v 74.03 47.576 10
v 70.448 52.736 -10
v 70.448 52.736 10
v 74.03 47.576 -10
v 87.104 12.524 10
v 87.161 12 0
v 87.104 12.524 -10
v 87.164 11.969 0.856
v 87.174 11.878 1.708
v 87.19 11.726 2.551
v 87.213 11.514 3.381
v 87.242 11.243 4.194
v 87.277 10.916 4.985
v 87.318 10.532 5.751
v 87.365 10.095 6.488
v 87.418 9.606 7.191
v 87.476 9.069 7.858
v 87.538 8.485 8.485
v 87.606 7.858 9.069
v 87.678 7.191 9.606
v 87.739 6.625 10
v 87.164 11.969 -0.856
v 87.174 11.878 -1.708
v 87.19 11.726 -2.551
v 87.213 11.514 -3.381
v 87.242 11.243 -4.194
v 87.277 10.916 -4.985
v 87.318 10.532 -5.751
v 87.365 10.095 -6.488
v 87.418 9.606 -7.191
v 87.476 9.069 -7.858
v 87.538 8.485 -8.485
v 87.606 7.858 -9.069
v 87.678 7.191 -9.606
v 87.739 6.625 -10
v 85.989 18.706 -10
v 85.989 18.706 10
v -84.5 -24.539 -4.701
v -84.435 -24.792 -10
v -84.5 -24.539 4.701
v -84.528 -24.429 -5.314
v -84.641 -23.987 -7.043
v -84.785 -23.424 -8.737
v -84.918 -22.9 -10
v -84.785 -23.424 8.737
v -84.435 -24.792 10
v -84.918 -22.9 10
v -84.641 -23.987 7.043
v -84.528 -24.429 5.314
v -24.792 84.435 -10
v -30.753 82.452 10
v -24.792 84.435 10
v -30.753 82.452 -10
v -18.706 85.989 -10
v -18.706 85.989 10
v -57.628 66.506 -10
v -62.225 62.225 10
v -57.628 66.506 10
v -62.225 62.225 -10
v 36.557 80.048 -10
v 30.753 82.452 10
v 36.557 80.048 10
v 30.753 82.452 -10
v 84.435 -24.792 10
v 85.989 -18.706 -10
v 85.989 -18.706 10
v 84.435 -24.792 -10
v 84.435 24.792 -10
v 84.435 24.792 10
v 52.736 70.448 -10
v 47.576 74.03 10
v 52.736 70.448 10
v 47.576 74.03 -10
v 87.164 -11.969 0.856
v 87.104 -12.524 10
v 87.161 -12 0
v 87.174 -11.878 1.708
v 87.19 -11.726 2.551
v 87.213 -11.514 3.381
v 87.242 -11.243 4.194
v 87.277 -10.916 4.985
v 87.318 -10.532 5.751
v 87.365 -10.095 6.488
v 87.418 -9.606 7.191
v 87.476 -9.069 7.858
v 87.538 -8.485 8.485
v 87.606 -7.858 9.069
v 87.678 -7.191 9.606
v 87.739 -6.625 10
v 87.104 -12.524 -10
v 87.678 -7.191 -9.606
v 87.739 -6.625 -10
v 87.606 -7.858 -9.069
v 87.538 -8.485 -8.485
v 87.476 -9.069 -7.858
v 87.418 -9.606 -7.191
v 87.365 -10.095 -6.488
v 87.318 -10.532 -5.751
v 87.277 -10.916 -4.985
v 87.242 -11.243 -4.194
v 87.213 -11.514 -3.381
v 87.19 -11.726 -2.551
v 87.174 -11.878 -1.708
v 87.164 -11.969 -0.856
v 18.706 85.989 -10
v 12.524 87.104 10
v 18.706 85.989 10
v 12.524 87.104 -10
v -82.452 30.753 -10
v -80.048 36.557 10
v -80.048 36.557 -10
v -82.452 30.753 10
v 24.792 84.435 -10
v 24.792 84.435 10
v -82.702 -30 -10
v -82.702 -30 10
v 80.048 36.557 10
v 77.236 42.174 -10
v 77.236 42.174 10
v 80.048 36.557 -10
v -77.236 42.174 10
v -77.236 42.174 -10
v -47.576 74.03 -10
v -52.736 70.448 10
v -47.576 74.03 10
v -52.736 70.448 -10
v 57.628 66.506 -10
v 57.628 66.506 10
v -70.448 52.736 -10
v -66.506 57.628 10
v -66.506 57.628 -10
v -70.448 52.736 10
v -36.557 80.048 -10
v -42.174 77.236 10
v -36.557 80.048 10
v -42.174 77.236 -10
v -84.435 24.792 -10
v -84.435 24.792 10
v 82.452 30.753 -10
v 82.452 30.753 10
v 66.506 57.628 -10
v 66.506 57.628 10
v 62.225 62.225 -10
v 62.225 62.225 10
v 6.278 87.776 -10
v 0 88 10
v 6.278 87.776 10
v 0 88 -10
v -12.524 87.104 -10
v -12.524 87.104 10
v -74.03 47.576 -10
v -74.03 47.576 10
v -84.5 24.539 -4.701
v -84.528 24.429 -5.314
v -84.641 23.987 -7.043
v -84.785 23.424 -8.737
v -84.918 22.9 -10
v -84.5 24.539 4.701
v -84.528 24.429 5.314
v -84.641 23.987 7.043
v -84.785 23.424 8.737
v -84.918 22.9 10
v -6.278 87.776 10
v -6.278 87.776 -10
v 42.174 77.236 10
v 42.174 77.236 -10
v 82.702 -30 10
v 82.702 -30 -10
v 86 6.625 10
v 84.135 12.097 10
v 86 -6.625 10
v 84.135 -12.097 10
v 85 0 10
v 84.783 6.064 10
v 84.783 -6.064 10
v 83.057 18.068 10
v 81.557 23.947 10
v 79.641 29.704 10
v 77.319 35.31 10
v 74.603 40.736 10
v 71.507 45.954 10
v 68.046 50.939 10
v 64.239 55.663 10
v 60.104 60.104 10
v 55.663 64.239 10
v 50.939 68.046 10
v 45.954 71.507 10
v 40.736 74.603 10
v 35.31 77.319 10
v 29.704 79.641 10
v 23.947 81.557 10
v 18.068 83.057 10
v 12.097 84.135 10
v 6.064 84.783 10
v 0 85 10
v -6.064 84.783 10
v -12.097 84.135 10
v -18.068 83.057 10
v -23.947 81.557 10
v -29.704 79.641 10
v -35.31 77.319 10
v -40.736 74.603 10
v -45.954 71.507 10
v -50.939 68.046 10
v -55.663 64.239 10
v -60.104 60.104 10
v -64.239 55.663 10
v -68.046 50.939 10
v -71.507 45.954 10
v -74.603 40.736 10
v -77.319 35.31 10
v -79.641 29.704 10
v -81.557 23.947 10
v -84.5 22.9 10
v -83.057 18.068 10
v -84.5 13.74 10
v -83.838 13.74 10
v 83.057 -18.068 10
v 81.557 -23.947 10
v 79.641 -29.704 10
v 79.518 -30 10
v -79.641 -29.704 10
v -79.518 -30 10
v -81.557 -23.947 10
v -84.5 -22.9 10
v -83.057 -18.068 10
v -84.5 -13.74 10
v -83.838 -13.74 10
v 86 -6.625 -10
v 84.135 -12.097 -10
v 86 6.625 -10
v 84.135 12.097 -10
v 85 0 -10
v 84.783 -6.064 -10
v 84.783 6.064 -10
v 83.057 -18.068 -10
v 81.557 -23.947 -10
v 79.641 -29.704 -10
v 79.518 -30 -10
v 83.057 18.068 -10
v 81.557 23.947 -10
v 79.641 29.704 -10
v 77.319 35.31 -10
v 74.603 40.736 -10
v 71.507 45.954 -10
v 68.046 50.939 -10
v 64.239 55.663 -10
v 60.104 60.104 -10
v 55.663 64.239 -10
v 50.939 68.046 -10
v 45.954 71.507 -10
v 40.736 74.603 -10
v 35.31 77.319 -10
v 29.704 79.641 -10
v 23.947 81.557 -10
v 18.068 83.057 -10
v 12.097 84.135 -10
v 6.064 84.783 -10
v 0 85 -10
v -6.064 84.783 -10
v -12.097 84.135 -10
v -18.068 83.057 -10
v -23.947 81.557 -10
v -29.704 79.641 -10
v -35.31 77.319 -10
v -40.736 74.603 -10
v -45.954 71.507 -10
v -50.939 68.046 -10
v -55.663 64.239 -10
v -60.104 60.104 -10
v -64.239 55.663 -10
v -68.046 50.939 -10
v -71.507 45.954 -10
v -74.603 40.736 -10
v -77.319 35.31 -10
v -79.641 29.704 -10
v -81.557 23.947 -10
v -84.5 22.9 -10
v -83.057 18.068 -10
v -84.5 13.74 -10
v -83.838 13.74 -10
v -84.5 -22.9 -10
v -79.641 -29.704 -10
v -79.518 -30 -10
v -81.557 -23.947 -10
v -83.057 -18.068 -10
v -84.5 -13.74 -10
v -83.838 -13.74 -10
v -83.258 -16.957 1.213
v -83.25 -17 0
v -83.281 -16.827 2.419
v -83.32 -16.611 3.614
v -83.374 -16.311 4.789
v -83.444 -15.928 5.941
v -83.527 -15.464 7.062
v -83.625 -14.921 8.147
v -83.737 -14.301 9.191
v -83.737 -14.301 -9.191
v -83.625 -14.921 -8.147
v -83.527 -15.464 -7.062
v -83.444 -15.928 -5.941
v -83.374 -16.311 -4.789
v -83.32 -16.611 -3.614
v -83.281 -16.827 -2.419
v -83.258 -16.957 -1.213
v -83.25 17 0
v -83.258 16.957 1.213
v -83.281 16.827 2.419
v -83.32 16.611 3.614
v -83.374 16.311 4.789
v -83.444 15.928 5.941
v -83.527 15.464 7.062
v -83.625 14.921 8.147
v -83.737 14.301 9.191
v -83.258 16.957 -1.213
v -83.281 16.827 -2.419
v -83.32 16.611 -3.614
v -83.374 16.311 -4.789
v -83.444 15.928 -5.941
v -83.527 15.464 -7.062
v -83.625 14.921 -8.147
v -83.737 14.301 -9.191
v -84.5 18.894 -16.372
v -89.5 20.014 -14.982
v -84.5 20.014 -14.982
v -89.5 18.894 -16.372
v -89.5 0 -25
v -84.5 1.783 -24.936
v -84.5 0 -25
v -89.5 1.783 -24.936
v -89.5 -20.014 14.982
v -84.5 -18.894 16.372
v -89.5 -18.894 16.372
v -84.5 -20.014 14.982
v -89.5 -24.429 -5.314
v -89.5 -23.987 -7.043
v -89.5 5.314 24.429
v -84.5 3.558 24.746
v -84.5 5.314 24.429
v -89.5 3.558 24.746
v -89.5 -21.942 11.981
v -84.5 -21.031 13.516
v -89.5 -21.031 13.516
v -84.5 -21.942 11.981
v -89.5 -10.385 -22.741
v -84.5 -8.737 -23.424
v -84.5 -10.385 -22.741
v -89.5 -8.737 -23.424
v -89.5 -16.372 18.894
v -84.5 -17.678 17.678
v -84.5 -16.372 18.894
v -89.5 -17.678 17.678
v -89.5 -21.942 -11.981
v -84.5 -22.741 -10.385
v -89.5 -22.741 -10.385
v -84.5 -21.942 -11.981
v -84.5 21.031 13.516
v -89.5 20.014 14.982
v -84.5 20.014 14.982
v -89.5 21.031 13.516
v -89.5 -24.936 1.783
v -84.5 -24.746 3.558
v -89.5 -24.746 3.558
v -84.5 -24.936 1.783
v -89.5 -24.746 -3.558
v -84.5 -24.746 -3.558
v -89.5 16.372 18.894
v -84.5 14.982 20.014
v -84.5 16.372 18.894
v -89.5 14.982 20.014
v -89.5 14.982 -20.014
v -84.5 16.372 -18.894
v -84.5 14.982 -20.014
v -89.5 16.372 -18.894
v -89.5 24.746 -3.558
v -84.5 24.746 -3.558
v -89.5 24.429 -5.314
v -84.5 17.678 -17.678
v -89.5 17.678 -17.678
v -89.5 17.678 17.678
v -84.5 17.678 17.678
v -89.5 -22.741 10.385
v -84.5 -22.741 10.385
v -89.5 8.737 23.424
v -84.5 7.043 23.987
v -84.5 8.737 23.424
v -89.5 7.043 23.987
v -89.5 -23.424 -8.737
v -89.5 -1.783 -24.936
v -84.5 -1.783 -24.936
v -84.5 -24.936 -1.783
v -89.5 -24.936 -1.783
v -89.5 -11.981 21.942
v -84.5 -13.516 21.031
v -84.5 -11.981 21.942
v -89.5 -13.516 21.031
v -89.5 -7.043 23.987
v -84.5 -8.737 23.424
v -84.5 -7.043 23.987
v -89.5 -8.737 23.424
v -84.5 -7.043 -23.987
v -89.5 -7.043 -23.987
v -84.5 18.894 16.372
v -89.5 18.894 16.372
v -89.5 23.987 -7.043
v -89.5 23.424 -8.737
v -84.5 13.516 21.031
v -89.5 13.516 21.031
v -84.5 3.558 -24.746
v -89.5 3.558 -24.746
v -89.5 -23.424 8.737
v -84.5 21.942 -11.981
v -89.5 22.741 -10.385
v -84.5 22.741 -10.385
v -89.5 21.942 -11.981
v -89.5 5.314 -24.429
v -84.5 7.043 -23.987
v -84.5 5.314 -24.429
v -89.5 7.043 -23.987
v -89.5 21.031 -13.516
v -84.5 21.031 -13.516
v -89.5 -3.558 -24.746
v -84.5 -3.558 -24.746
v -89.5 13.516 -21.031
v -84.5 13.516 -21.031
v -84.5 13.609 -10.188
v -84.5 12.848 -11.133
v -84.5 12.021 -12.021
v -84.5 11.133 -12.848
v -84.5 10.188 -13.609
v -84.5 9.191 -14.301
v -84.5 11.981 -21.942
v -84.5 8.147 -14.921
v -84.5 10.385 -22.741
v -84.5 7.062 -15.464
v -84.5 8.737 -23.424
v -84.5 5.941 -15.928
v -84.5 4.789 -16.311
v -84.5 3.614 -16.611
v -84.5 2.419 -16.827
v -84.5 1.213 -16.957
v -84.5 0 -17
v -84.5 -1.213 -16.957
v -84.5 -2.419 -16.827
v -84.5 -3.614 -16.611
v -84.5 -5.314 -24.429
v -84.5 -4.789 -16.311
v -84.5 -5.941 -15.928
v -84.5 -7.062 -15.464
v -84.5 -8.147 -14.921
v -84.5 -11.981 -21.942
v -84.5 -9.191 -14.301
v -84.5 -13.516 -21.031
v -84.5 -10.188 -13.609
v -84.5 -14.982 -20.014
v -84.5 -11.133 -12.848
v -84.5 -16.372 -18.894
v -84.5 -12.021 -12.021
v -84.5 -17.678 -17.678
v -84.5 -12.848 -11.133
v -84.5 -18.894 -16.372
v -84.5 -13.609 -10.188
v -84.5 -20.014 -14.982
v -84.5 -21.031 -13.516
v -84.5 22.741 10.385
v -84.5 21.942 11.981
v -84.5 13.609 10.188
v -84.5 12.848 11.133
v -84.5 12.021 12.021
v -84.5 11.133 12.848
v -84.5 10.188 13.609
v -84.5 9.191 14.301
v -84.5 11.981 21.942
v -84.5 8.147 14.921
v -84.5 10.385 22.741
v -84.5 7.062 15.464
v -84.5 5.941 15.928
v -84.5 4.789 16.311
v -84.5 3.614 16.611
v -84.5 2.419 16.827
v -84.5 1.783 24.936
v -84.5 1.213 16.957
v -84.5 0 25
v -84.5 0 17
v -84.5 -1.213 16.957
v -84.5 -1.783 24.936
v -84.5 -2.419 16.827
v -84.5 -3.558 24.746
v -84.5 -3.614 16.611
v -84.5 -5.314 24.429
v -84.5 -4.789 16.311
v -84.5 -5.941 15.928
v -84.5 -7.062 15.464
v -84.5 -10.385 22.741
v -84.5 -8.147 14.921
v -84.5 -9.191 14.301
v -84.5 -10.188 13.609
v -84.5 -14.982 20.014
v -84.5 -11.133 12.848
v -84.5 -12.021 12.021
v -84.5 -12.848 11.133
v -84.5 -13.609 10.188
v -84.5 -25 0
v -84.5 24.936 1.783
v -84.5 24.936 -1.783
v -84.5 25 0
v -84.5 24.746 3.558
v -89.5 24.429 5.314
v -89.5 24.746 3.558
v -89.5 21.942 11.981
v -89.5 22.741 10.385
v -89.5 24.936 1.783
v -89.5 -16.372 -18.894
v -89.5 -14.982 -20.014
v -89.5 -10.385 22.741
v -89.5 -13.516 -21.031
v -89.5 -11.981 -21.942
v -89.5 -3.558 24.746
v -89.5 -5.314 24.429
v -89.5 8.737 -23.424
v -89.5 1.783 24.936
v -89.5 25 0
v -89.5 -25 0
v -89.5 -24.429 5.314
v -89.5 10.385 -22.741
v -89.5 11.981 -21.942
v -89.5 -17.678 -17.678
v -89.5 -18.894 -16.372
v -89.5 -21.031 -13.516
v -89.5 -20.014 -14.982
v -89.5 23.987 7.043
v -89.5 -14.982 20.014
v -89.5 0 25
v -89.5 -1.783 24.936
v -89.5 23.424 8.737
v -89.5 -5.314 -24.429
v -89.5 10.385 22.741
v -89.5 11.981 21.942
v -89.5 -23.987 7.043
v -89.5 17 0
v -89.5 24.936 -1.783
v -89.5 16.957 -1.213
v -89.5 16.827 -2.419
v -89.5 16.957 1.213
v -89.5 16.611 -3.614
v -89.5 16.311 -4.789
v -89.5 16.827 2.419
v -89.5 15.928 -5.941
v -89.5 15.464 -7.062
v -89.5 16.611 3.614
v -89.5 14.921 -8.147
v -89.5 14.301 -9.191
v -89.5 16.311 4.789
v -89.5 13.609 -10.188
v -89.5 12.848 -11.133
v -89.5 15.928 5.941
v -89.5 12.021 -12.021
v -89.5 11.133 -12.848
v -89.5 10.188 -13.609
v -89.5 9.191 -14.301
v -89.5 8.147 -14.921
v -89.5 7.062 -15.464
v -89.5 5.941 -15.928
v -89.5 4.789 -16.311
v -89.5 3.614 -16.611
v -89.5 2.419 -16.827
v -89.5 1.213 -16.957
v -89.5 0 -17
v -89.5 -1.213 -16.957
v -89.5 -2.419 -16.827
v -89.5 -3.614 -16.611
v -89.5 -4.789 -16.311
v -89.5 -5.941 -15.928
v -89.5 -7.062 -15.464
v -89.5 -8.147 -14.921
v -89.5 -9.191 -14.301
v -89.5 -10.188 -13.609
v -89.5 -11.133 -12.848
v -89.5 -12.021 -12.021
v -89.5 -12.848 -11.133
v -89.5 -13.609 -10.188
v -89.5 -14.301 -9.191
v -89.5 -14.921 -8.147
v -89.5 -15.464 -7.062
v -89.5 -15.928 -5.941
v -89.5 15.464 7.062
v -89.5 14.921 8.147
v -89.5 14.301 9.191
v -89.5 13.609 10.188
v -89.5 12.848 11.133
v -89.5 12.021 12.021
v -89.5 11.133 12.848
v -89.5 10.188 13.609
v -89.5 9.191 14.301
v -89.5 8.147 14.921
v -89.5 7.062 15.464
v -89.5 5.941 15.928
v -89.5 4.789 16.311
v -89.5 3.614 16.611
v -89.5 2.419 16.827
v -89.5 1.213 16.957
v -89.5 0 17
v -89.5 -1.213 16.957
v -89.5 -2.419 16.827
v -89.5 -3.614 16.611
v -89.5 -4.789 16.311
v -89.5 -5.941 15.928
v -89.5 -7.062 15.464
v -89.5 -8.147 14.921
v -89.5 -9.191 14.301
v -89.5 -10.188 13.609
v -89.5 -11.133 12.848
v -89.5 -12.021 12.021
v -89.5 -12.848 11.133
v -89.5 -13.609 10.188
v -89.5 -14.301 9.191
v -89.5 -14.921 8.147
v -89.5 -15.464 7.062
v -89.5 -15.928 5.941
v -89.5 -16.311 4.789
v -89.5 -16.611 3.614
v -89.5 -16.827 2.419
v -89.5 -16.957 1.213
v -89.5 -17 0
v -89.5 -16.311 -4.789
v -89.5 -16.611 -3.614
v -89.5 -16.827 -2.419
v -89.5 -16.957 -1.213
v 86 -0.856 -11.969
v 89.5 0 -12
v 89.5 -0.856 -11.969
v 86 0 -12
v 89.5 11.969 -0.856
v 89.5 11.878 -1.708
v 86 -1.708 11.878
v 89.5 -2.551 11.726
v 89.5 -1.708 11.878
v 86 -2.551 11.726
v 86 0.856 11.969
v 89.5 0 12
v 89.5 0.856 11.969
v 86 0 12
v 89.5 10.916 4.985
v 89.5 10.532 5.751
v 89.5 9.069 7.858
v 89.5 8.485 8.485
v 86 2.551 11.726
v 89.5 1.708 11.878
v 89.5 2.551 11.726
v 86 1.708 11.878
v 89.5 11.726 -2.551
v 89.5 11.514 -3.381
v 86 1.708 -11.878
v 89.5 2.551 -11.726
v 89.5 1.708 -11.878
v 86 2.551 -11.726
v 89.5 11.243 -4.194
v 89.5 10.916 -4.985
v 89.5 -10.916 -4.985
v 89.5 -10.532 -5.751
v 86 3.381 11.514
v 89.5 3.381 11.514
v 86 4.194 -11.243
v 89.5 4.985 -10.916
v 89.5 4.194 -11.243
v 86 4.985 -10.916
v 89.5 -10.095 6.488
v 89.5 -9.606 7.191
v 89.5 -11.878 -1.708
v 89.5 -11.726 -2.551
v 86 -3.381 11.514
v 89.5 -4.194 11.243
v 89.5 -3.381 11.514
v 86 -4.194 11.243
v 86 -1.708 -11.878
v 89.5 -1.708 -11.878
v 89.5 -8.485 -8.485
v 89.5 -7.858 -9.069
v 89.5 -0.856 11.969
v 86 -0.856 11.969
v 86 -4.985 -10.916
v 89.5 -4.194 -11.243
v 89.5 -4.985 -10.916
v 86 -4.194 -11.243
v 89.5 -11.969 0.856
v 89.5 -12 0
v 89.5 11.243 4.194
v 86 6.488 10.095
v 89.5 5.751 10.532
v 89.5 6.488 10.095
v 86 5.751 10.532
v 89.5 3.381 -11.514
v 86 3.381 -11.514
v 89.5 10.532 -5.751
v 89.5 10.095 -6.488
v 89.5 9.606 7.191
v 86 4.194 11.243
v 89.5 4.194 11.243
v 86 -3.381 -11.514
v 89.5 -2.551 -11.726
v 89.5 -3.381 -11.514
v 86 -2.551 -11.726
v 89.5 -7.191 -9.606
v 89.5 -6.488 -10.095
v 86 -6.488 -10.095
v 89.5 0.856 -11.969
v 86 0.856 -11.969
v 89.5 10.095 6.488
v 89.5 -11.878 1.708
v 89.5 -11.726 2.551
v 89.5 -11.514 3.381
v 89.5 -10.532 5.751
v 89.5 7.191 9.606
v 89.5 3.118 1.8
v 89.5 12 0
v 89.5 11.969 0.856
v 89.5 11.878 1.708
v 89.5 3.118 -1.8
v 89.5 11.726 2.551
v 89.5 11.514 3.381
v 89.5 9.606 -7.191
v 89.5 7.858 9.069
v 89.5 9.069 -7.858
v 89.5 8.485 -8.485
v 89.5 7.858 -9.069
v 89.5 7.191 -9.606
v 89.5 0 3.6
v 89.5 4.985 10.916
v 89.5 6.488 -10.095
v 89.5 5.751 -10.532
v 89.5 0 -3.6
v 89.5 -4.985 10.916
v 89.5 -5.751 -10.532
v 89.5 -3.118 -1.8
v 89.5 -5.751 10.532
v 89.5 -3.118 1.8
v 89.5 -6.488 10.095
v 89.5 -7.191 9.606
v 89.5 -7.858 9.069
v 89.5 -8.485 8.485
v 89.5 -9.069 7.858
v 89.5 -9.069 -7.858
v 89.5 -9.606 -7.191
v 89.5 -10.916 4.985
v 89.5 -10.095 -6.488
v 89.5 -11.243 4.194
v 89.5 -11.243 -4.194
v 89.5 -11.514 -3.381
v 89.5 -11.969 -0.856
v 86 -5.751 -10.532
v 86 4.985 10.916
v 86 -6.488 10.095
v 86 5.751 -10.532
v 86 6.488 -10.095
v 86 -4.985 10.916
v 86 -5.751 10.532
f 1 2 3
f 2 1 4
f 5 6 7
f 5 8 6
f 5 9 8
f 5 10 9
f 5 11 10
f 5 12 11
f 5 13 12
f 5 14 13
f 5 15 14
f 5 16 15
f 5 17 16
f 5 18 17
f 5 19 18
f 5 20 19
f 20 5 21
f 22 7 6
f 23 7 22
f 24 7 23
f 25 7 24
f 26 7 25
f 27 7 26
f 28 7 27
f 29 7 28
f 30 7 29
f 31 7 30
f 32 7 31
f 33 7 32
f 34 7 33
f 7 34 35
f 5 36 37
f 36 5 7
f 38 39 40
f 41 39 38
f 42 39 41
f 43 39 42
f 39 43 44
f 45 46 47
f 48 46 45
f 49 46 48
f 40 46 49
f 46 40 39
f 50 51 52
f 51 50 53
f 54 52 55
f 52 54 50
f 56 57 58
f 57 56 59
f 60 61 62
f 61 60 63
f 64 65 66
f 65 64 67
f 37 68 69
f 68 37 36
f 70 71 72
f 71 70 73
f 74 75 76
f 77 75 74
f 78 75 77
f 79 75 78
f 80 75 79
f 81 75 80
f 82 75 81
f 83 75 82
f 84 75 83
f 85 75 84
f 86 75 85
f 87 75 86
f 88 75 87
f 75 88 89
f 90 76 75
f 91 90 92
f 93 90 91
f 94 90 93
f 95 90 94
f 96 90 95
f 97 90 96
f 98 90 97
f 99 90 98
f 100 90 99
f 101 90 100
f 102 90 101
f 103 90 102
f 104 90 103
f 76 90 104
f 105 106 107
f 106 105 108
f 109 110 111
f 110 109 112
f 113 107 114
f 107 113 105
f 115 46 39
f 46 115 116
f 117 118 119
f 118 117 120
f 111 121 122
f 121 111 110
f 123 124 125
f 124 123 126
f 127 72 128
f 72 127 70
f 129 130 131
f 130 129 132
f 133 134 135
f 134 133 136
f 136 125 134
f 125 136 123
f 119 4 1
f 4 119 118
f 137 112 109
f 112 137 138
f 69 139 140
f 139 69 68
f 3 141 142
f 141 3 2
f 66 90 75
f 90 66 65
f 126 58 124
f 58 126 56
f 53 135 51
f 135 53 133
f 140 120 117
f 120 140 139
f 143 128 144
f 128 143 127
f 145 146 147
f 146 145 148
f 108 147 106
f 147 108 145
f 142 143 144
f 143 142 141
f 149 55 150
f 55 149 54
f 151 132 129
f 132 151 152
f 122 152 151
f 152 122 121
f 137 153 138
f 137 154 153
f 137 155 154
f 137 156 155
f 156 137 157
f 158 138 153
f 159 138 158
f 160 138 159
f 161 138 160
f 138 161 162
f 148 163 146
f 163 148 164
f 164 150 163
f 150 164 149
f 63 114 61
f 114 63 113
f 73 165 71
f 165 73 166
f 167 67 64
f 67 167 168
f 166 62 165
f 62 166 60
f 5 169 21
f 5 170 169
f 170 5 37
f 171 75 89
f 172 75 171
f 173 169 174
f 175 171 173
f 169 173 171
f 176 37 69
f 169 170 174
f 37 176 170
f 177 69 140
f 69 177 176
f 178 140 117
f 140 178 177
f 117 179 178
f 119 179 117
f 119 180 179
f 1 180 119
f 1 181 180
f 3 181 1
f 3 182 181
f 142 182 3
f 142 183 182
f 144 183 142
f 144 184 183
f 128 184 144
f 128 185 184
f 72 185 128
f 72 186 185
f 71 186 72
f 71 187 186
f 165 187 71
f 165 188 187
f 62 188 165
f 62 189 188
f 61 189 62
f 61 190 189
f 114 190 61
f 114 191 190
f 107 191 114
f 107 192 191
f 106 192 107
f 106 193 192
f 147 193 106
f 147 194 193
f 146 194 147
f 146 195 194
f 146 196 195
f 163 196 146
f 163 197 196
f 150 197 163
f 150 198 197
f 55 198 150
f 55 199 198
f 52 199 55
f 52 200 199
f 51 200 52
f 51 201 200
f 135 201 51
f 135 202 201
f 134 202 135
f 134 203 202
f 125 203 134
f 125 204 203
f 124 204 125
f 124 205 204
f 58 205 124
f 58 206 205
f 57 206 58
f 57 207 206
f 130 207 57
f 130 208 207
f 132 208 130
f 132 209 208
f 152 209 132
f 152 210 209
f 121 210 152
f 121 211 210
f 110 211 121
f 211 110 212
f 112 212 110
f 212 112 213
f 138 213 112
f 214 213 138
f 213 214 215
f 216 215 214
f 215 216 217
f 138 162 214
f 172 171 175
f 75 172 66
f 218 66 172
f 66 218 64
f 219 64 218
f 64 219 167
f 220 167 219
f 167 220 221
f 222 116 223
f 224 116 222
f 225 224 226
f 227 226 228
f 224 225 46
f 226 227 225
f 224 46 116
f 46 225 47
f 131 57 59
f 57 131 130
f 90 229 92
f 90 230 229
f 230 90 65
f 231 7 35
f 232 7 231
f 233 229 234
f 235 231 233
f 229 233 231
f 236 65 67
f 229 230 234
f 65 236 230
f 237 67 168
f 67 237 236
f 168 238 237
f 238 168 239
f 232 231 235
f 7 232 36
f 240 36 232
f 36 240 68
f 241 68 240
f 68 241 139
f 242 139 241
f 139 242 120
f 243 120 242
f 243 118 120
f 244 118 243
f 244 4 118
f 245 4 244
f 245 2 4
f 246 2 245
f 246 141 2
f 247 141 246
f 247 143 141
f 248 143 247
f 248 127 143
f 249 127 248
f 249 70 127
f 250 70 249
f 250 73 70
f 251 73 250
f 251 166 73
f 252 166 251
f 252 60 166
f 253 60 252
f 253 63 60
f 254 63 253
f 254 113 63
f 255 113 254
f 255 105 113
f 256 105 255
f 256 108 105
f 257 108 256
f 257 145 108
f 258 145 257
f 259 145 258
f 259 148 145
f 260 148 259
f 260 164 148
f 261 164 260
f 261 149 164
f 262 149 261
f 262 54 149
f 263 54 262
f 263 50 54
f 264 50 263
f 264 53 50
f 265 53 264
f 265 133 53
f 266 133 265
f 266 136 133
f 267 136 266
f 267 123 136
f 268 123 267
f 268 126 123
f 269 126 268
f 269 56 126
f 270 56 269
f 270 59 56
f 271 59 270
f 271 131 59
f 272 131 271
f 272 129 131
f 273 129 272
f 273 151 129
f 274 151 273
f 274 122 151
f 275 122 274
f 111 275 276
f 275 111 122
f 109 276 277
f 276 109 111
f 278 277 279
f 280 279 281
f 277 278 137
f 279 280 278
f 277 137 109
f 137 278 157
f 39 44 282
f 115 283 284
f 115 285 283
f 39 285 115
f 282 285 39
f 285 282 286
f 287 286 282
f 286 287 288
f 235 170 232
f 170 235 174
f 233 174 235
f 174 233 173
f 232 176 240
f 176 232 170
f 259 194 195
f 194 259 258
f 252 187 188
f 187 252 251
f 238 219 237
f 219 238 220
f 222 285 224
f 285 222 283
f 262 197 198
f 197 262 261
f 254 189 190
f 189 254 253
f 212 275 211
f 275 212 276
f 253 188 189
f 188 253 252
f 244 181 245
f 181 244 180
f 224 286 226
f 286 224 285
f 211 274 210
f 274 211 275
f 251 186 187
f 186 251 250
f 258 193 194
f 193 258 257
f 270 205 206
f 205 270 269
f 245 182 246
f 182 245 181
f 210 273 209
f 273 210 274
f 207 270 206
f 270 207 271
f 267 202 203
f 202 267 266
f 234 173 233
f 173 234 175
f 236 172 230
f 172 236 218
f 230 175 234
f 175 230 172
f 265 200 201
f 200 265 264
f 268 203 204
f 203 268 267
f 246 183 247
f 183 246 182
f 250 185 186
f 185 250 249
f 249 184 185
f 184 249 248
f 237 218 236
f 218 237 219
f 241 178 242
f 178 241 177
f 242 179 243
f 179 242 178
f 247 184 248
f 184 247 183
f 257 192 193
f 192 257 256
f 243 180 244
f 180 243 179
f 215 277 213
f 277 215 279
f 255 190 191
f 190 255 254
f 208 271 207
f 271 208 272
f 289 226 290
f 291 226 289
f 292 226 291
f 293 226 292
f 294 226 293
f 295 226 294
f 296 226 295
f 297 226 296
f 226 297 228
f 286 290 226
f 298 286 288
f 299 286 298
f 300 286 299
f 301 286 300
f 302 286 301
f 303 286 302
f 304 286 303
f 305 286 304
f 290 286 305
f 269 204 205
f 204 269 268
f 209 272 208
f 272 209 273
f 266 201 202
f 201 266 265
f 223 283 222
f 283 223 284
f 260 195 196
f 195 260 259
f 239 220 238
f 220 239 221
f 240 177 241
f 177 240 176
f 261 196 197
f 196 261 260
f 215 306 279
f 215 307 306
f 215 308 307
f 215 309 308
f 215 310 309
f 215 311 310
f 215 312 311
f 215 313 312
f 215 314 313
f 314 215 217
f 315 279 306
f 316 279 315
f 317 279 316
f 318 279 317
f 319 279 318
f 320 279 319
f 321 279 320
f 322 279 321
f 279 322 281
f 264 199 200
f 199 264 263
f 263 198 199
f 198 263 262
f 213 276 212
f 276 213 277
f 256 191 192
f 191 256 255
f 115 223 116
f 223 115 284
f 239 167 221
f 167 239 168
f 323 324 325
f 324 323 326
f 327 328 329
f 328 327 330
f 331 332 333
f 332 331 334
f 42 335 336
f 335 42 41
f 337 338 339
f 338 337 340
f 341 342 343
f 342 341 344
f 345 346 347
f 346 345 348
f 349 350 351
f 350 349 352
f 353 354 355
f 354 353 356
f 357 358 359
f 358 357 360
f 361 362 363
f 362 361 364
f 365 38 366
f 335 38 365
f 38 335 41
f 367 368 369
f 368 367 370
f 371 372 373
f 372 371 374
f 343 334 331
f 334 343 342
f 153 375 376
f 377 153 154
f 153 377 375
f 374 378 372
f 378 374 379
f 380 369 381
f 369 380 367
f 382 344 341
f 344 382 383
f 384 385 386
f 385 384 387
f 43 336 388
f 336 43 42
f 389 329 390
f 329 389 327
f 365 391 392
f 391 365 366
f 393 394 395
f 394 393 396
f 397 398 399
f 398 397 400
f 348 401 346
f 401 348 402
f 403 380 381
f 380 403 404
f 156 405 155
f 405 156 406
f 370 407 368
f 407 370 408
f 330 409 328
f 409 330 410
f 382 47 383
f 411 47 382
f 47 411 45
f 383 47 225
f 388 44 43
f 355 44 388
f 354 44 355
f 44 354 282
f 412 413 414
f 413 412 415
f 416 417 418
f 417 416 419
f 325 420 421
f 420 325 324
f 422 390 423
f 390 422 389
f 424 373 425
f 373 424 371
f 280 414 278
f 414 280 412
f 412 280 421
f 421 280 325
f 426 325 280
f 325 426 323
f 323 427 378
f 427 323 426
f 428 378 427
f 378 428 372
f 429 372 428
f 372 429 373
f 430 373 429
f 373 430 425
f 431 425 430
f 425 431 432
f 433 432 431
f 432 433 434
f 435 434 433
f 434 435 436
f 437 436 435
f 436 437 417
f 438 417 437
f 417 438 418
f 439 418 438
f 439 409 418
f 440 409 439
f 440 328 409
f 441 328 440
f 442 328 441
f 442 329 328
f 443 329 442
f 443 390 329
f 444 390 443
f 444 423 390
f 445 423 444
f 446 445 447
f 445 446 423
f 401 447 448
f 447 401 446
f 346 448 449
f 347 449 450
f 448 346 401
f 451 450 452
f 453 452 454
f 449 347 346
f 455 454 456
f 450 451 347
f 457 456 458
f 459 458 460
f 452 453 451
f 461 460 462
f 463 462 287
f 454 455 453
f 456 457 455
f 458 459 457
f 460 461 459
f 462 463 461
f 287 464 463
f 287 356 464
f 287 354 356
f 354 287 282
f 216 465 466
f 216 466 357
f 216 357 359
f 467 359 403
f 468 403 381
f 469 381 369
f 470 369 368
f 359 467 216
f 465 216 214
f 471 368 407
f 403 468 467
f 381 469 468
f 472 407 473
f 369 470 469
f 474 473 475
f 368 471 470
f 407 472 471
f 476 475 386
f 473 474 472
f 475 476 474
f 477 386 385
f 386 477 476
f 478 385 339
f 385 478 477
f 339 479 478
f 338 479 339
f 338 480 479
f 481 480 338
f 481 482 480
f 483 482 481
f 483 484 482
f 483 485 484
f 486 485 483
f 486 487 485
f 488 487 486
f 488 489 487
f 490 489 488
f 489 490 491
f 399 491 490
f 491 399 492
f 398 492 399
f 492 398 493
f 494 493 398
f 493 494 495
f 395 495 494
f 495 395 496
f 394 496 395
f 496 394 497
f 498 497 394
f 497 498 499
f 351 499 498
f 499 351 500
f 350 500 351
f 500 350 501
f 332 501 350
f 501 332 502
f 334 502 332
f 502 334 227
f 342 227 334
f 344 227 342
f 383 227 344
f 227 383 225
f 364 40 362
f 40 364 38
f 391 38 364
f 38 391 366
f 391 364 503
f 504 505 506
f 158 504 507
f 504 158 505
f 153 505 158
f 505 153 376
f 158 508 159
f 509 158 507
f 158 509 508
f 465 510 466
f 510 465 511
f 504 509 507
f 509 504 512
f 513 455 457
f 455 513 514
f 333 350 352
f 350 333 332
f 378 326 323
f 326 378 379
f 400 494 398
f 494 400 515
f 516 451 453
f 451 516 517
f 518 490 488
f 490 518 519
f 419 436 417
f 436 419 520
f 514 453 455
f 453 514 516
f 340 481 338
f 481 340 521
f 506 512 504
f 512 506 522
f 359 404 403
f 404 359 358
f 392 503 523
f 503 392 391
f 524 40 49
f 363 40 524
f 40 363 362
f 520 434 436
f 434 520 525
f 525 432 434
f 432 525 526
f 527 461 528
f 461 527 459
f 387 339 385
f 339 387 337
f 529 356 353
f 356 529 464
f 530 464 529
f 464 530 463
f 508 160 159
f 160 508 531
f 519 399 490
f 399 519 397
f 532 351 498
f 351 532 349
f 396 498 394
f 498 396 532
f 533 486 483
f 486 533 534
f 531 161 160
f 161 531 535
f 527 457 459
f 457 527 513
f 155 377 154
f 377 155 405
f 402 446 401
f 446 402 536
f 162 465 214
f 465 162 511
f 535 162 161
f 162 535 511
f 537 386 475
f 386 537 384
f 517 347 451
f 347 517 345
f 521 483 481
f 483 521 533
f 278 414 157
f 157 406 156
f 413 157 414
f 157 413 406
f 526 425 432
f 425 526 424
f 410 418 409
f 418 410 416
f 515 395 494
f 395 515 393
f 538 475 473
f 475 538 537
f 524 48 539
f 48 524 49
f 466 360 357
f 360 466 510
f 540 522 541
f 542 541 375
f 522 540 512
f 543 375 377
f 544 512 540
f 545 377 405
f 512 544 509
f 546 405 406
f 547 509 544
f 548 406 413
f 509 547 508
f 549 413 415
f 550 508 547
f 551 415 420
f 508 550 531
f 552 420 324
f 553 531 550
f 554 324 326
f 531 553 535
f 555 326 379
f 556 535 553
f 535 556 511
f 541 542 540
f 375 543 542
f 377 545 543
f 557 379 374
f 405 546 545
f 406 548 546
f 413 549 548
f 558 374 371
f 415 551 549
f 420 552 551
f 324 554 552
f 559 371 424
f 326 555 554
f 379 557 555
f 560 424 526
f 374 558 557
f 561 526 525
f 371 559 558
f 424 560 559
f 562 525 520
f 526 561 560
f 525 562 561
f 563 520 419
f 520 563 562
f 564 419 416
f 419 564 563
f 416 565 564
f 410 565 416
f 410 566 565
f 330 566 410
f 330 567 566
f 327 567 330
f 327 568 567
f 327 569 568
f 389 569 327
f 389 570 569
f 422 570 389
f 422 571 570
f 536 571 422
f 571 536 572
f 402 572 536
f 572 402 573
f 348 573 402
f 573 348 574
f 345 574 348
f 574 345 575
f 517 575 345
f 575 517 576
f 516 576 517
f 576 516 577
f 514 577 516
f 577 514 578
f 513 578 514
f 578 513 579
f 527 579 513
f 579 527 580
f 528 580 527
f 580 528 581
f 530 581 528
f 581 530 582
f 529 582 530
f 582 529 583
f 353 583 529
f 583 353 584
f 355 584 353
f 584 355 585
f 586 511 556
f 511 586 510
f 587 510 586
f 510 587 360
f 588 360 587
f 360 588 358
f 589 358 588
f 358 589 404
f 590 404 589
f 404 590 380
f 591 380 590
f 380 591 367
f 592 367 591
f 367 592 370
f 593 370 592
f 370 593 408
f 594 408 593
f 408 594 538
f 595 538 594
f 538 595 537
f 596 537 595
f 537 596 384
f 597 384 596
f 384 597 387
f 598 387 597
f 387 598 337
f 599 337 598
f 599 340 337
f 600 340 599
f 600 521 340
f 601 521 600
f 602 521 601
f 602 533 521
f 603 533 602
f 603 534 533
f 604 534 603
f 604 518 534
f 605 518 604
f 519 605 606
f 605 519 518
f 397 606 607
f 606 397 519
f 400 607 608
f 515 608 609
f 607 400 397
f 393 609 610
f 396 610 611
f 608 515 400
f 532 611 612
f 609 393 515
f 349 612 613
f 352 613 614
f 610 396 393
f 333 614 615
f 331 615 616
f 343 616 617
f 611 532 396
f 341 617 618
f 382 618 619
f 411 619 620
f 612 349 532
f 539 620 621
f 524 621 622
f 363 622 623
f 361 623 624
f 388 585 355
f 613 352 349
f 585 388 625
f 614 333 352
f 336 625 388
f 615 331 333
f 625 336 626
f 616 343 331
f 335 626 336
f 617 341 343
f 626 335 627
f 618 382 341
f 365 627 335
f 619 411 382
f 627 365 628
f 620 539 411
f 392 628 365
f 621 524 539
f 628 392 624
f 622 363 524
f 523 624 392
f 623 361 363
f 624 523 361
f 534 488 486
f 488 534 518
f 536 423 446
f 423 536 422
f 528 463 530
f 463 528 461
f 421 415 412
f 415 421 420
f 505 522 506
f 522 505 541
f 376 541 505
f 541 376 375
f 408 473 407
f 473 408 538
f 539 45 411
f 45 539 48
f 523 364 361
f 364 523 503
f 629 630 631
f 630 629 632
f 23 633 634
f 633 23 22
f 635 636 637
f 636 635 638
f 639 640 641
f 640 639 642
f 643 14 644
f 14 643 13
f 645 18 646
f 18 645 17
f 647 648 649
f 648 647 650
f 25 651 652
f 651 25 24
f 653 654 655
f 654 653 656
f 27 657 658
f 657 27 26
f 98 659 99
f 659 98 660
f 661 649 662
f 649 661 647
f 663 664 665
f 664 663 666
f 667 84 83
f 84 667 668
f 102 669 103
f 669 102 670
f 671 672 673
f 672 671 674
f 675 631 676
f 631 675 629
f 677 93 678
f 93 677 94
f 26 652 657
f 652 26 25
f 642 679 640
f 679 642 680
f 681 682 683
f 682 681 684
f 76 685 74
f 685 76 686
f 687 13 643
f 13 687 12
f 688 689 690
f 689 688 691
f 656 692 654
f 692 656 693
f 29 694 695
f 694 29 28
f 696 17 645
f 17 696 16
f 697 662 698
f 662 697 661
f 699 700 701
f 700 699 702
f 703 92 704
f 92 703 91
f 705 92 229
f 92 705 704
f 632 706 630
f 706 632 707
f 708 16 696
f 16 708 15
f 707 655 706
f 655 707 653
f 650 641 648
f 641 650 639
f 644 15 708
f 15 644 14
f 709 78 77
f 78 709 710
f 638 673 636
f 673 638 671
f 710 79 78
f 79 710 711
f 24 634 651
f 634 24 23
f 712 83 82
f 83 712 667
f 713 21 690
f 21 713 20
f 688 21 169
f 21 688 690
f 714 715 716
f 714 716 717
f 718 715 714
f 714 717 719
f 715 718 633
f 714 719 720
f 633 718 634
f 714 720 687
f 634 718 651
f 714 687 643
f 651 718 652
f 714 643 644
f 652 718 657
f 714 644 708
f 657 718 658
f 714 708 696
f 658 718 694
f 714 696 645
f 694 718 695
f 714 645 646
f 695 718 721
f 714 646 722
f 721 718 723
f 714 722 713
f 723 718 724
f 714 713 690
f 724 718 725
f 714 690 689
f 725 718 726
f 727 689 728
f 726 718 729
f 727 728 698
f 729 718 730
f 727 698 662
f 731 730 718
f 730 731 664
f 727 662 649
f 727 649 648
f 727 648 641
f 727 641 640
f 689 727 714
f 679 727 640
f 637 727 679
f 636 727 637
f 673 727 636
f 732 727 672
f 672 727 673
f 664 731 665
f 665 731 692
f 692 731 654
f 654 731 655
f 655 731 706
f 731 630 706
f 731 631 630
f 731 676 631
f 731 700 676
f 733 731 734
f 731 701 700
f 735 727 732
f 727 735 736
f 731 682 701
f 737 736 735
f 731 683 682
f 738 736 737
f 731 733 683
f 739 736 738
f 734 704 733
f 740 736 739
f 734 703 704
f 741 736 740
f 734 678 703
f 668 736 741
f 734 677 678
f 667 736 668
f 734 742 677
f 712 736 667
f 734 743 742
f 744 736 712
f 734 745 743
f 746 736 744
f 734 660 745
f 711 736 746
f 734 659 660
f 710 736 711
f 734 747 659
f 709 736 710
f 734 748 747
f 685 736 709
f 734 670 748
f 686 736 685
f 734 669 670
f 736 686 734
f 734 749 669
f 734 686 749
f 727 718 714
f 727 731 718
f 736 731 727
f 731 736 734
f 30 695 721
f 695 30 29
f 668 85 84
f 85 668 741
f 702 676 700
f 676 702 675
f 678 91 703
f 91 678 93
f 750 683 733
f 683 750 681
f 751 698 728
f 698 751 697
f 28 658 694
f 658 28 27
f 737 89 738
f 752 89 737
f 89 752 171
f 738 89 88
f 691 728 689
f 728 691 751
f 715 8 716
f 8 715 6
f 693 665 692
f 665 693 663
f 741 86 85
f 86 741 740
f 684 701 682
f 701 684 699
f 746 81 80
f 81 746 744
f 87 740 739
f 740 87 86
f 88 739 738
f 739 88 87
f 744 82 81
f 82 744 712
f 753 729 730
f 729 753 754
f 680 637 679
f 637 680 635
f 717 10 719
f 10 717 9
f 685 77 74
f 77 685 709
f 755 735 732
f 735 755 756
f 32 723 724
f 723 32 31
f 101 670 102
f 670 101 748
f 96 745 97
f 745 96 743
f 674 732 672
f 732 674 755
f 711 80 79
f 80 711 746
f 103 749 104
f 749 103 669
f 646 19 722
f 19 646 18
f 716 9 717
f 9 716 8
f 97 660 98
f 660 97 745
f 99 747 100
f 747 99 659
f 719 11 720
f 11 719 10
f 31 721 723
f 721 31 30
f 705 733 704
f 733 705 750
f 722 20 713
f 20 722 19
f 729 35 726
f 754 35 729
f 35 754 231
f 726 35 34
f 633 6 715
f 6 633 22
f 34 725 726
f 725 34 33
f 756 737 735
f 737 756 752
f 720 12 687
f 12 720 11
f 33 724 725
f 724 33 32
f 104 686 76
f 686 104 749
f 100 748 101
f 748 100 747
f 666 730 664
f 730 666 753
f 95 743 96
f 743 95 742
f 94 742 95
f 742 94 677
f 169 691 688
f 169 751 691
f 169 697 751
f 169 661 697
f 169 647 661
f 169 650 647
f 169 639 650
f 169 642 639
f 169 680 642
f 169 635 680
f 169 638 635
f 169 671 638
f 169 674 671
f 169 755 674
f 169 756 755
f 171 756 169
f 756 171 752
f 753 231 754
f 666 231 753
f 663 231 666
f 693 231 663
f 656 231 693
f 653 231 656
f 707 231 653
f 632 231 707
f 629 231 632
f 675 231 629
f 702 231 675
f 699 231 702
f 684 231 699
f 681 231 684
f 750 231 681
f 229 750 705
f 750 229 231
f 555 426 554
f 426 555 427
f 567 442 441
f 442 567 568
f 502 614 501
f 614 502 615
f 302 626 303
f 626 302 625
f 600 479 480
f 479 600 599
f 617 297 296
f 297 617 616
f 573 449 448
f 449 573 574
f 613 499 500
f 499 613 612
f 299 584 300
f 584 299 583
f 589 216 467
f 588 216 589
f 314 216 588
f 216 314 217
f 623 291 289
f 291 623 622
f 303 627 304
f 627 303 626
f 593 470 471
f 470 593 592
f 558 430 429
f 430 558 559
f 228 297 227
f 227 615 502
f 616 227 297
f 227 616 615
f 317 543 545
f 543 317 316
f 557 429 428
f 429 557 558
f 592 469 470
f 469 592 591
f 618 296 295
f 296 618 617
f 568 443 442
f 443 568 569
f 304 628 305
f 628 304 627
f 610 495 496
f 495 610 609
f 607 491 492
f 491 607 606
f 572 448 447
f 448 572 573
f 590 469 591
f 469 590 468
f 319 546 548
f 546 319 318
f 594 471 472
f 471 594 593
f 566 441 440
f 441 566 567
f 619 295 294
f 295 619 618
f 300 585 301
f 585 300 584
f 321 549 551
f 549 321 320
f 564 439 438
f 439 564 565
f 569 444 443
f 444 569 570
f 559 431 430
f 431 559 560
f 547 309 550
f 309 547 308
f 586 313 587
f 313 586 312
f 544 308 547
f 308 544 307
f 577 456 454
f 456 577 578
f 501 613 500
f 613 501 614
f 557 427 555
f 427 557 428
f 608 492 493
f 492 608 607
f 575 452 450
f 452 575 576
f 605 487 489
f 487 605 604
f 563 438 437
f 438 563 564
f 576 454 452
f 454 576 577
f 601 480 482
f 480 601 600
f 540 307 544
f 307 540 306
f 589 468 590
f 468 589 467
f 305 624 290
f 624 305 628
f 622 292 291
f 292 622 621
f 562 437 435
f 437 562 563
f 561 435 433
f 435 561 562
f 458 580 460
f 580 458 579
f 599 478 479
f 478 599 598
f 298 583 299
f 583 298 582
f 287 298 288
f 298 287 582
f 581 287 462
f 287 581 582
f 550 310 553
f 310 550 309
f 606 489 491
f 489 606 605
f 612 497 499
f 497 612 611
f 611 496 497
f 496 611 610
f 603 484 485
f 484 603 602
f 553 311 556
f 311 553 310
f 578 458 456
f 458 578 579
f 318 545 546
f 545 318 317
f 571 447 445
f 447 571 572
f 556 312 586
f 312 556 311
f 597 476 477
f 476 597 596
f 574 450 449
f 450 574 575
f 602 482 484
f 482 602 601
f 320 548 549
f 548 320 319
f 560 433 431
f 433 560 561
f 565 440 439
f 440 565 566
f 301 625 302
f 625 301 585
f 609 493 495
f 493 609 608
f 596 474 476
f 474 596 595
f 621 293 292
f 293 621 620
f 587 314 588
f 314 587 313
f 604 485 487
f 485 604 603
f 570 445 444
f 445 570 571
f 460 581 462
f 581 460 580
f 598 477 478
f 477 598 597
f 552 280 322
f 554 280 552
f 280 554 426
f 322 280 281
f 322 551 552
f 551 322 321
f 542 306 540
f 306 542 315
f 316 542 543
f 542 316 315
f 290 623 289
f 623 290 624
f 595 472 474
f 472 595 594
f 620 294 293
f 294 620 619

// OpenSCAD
// arm2scad
// scanner part

//-----------------------------------------------------------
module arm2(){
    
ra=88;
F2=88;

  difference(){
    union(){
      // main loop
      difference(){
        // boss
        cylinder(r=ra,h=20,$fn=F2, center=true);
        
        // cut to make a loop
        cylinder(r=ra-3,h=22,$fn=F2, center=true);
        
        // remove the front edge
        translate([0,-130,0])
        cube([200,200,40],center=true);
      }

      // reinforce left
      color("cyan")
      translate([-ra-1.5,0,0])  
      rotate([0,90,0])
      cylinder(r=25,h=5,$fn=F2);
      
      // reinforce right
      translate([ra+1.5,0,0])  
      rotate([0,-90,0])
      cylinder(r=12,h=3.5,$fn=F2);
      
    } // end union  

    // cut for the left axle  
    translate([-ra-2,0,0])  
    rotate([0,90,0])
    cylinder(r=17,h=8,$fn=88);

    // cut for the right axle  
    translate([ra+1.5,0,0])  
    rotate([0,90,0])
    cylinder(r=3.6,h=6,$fn=6);

  }
}
//=========================================

arm2();

//==============================================
